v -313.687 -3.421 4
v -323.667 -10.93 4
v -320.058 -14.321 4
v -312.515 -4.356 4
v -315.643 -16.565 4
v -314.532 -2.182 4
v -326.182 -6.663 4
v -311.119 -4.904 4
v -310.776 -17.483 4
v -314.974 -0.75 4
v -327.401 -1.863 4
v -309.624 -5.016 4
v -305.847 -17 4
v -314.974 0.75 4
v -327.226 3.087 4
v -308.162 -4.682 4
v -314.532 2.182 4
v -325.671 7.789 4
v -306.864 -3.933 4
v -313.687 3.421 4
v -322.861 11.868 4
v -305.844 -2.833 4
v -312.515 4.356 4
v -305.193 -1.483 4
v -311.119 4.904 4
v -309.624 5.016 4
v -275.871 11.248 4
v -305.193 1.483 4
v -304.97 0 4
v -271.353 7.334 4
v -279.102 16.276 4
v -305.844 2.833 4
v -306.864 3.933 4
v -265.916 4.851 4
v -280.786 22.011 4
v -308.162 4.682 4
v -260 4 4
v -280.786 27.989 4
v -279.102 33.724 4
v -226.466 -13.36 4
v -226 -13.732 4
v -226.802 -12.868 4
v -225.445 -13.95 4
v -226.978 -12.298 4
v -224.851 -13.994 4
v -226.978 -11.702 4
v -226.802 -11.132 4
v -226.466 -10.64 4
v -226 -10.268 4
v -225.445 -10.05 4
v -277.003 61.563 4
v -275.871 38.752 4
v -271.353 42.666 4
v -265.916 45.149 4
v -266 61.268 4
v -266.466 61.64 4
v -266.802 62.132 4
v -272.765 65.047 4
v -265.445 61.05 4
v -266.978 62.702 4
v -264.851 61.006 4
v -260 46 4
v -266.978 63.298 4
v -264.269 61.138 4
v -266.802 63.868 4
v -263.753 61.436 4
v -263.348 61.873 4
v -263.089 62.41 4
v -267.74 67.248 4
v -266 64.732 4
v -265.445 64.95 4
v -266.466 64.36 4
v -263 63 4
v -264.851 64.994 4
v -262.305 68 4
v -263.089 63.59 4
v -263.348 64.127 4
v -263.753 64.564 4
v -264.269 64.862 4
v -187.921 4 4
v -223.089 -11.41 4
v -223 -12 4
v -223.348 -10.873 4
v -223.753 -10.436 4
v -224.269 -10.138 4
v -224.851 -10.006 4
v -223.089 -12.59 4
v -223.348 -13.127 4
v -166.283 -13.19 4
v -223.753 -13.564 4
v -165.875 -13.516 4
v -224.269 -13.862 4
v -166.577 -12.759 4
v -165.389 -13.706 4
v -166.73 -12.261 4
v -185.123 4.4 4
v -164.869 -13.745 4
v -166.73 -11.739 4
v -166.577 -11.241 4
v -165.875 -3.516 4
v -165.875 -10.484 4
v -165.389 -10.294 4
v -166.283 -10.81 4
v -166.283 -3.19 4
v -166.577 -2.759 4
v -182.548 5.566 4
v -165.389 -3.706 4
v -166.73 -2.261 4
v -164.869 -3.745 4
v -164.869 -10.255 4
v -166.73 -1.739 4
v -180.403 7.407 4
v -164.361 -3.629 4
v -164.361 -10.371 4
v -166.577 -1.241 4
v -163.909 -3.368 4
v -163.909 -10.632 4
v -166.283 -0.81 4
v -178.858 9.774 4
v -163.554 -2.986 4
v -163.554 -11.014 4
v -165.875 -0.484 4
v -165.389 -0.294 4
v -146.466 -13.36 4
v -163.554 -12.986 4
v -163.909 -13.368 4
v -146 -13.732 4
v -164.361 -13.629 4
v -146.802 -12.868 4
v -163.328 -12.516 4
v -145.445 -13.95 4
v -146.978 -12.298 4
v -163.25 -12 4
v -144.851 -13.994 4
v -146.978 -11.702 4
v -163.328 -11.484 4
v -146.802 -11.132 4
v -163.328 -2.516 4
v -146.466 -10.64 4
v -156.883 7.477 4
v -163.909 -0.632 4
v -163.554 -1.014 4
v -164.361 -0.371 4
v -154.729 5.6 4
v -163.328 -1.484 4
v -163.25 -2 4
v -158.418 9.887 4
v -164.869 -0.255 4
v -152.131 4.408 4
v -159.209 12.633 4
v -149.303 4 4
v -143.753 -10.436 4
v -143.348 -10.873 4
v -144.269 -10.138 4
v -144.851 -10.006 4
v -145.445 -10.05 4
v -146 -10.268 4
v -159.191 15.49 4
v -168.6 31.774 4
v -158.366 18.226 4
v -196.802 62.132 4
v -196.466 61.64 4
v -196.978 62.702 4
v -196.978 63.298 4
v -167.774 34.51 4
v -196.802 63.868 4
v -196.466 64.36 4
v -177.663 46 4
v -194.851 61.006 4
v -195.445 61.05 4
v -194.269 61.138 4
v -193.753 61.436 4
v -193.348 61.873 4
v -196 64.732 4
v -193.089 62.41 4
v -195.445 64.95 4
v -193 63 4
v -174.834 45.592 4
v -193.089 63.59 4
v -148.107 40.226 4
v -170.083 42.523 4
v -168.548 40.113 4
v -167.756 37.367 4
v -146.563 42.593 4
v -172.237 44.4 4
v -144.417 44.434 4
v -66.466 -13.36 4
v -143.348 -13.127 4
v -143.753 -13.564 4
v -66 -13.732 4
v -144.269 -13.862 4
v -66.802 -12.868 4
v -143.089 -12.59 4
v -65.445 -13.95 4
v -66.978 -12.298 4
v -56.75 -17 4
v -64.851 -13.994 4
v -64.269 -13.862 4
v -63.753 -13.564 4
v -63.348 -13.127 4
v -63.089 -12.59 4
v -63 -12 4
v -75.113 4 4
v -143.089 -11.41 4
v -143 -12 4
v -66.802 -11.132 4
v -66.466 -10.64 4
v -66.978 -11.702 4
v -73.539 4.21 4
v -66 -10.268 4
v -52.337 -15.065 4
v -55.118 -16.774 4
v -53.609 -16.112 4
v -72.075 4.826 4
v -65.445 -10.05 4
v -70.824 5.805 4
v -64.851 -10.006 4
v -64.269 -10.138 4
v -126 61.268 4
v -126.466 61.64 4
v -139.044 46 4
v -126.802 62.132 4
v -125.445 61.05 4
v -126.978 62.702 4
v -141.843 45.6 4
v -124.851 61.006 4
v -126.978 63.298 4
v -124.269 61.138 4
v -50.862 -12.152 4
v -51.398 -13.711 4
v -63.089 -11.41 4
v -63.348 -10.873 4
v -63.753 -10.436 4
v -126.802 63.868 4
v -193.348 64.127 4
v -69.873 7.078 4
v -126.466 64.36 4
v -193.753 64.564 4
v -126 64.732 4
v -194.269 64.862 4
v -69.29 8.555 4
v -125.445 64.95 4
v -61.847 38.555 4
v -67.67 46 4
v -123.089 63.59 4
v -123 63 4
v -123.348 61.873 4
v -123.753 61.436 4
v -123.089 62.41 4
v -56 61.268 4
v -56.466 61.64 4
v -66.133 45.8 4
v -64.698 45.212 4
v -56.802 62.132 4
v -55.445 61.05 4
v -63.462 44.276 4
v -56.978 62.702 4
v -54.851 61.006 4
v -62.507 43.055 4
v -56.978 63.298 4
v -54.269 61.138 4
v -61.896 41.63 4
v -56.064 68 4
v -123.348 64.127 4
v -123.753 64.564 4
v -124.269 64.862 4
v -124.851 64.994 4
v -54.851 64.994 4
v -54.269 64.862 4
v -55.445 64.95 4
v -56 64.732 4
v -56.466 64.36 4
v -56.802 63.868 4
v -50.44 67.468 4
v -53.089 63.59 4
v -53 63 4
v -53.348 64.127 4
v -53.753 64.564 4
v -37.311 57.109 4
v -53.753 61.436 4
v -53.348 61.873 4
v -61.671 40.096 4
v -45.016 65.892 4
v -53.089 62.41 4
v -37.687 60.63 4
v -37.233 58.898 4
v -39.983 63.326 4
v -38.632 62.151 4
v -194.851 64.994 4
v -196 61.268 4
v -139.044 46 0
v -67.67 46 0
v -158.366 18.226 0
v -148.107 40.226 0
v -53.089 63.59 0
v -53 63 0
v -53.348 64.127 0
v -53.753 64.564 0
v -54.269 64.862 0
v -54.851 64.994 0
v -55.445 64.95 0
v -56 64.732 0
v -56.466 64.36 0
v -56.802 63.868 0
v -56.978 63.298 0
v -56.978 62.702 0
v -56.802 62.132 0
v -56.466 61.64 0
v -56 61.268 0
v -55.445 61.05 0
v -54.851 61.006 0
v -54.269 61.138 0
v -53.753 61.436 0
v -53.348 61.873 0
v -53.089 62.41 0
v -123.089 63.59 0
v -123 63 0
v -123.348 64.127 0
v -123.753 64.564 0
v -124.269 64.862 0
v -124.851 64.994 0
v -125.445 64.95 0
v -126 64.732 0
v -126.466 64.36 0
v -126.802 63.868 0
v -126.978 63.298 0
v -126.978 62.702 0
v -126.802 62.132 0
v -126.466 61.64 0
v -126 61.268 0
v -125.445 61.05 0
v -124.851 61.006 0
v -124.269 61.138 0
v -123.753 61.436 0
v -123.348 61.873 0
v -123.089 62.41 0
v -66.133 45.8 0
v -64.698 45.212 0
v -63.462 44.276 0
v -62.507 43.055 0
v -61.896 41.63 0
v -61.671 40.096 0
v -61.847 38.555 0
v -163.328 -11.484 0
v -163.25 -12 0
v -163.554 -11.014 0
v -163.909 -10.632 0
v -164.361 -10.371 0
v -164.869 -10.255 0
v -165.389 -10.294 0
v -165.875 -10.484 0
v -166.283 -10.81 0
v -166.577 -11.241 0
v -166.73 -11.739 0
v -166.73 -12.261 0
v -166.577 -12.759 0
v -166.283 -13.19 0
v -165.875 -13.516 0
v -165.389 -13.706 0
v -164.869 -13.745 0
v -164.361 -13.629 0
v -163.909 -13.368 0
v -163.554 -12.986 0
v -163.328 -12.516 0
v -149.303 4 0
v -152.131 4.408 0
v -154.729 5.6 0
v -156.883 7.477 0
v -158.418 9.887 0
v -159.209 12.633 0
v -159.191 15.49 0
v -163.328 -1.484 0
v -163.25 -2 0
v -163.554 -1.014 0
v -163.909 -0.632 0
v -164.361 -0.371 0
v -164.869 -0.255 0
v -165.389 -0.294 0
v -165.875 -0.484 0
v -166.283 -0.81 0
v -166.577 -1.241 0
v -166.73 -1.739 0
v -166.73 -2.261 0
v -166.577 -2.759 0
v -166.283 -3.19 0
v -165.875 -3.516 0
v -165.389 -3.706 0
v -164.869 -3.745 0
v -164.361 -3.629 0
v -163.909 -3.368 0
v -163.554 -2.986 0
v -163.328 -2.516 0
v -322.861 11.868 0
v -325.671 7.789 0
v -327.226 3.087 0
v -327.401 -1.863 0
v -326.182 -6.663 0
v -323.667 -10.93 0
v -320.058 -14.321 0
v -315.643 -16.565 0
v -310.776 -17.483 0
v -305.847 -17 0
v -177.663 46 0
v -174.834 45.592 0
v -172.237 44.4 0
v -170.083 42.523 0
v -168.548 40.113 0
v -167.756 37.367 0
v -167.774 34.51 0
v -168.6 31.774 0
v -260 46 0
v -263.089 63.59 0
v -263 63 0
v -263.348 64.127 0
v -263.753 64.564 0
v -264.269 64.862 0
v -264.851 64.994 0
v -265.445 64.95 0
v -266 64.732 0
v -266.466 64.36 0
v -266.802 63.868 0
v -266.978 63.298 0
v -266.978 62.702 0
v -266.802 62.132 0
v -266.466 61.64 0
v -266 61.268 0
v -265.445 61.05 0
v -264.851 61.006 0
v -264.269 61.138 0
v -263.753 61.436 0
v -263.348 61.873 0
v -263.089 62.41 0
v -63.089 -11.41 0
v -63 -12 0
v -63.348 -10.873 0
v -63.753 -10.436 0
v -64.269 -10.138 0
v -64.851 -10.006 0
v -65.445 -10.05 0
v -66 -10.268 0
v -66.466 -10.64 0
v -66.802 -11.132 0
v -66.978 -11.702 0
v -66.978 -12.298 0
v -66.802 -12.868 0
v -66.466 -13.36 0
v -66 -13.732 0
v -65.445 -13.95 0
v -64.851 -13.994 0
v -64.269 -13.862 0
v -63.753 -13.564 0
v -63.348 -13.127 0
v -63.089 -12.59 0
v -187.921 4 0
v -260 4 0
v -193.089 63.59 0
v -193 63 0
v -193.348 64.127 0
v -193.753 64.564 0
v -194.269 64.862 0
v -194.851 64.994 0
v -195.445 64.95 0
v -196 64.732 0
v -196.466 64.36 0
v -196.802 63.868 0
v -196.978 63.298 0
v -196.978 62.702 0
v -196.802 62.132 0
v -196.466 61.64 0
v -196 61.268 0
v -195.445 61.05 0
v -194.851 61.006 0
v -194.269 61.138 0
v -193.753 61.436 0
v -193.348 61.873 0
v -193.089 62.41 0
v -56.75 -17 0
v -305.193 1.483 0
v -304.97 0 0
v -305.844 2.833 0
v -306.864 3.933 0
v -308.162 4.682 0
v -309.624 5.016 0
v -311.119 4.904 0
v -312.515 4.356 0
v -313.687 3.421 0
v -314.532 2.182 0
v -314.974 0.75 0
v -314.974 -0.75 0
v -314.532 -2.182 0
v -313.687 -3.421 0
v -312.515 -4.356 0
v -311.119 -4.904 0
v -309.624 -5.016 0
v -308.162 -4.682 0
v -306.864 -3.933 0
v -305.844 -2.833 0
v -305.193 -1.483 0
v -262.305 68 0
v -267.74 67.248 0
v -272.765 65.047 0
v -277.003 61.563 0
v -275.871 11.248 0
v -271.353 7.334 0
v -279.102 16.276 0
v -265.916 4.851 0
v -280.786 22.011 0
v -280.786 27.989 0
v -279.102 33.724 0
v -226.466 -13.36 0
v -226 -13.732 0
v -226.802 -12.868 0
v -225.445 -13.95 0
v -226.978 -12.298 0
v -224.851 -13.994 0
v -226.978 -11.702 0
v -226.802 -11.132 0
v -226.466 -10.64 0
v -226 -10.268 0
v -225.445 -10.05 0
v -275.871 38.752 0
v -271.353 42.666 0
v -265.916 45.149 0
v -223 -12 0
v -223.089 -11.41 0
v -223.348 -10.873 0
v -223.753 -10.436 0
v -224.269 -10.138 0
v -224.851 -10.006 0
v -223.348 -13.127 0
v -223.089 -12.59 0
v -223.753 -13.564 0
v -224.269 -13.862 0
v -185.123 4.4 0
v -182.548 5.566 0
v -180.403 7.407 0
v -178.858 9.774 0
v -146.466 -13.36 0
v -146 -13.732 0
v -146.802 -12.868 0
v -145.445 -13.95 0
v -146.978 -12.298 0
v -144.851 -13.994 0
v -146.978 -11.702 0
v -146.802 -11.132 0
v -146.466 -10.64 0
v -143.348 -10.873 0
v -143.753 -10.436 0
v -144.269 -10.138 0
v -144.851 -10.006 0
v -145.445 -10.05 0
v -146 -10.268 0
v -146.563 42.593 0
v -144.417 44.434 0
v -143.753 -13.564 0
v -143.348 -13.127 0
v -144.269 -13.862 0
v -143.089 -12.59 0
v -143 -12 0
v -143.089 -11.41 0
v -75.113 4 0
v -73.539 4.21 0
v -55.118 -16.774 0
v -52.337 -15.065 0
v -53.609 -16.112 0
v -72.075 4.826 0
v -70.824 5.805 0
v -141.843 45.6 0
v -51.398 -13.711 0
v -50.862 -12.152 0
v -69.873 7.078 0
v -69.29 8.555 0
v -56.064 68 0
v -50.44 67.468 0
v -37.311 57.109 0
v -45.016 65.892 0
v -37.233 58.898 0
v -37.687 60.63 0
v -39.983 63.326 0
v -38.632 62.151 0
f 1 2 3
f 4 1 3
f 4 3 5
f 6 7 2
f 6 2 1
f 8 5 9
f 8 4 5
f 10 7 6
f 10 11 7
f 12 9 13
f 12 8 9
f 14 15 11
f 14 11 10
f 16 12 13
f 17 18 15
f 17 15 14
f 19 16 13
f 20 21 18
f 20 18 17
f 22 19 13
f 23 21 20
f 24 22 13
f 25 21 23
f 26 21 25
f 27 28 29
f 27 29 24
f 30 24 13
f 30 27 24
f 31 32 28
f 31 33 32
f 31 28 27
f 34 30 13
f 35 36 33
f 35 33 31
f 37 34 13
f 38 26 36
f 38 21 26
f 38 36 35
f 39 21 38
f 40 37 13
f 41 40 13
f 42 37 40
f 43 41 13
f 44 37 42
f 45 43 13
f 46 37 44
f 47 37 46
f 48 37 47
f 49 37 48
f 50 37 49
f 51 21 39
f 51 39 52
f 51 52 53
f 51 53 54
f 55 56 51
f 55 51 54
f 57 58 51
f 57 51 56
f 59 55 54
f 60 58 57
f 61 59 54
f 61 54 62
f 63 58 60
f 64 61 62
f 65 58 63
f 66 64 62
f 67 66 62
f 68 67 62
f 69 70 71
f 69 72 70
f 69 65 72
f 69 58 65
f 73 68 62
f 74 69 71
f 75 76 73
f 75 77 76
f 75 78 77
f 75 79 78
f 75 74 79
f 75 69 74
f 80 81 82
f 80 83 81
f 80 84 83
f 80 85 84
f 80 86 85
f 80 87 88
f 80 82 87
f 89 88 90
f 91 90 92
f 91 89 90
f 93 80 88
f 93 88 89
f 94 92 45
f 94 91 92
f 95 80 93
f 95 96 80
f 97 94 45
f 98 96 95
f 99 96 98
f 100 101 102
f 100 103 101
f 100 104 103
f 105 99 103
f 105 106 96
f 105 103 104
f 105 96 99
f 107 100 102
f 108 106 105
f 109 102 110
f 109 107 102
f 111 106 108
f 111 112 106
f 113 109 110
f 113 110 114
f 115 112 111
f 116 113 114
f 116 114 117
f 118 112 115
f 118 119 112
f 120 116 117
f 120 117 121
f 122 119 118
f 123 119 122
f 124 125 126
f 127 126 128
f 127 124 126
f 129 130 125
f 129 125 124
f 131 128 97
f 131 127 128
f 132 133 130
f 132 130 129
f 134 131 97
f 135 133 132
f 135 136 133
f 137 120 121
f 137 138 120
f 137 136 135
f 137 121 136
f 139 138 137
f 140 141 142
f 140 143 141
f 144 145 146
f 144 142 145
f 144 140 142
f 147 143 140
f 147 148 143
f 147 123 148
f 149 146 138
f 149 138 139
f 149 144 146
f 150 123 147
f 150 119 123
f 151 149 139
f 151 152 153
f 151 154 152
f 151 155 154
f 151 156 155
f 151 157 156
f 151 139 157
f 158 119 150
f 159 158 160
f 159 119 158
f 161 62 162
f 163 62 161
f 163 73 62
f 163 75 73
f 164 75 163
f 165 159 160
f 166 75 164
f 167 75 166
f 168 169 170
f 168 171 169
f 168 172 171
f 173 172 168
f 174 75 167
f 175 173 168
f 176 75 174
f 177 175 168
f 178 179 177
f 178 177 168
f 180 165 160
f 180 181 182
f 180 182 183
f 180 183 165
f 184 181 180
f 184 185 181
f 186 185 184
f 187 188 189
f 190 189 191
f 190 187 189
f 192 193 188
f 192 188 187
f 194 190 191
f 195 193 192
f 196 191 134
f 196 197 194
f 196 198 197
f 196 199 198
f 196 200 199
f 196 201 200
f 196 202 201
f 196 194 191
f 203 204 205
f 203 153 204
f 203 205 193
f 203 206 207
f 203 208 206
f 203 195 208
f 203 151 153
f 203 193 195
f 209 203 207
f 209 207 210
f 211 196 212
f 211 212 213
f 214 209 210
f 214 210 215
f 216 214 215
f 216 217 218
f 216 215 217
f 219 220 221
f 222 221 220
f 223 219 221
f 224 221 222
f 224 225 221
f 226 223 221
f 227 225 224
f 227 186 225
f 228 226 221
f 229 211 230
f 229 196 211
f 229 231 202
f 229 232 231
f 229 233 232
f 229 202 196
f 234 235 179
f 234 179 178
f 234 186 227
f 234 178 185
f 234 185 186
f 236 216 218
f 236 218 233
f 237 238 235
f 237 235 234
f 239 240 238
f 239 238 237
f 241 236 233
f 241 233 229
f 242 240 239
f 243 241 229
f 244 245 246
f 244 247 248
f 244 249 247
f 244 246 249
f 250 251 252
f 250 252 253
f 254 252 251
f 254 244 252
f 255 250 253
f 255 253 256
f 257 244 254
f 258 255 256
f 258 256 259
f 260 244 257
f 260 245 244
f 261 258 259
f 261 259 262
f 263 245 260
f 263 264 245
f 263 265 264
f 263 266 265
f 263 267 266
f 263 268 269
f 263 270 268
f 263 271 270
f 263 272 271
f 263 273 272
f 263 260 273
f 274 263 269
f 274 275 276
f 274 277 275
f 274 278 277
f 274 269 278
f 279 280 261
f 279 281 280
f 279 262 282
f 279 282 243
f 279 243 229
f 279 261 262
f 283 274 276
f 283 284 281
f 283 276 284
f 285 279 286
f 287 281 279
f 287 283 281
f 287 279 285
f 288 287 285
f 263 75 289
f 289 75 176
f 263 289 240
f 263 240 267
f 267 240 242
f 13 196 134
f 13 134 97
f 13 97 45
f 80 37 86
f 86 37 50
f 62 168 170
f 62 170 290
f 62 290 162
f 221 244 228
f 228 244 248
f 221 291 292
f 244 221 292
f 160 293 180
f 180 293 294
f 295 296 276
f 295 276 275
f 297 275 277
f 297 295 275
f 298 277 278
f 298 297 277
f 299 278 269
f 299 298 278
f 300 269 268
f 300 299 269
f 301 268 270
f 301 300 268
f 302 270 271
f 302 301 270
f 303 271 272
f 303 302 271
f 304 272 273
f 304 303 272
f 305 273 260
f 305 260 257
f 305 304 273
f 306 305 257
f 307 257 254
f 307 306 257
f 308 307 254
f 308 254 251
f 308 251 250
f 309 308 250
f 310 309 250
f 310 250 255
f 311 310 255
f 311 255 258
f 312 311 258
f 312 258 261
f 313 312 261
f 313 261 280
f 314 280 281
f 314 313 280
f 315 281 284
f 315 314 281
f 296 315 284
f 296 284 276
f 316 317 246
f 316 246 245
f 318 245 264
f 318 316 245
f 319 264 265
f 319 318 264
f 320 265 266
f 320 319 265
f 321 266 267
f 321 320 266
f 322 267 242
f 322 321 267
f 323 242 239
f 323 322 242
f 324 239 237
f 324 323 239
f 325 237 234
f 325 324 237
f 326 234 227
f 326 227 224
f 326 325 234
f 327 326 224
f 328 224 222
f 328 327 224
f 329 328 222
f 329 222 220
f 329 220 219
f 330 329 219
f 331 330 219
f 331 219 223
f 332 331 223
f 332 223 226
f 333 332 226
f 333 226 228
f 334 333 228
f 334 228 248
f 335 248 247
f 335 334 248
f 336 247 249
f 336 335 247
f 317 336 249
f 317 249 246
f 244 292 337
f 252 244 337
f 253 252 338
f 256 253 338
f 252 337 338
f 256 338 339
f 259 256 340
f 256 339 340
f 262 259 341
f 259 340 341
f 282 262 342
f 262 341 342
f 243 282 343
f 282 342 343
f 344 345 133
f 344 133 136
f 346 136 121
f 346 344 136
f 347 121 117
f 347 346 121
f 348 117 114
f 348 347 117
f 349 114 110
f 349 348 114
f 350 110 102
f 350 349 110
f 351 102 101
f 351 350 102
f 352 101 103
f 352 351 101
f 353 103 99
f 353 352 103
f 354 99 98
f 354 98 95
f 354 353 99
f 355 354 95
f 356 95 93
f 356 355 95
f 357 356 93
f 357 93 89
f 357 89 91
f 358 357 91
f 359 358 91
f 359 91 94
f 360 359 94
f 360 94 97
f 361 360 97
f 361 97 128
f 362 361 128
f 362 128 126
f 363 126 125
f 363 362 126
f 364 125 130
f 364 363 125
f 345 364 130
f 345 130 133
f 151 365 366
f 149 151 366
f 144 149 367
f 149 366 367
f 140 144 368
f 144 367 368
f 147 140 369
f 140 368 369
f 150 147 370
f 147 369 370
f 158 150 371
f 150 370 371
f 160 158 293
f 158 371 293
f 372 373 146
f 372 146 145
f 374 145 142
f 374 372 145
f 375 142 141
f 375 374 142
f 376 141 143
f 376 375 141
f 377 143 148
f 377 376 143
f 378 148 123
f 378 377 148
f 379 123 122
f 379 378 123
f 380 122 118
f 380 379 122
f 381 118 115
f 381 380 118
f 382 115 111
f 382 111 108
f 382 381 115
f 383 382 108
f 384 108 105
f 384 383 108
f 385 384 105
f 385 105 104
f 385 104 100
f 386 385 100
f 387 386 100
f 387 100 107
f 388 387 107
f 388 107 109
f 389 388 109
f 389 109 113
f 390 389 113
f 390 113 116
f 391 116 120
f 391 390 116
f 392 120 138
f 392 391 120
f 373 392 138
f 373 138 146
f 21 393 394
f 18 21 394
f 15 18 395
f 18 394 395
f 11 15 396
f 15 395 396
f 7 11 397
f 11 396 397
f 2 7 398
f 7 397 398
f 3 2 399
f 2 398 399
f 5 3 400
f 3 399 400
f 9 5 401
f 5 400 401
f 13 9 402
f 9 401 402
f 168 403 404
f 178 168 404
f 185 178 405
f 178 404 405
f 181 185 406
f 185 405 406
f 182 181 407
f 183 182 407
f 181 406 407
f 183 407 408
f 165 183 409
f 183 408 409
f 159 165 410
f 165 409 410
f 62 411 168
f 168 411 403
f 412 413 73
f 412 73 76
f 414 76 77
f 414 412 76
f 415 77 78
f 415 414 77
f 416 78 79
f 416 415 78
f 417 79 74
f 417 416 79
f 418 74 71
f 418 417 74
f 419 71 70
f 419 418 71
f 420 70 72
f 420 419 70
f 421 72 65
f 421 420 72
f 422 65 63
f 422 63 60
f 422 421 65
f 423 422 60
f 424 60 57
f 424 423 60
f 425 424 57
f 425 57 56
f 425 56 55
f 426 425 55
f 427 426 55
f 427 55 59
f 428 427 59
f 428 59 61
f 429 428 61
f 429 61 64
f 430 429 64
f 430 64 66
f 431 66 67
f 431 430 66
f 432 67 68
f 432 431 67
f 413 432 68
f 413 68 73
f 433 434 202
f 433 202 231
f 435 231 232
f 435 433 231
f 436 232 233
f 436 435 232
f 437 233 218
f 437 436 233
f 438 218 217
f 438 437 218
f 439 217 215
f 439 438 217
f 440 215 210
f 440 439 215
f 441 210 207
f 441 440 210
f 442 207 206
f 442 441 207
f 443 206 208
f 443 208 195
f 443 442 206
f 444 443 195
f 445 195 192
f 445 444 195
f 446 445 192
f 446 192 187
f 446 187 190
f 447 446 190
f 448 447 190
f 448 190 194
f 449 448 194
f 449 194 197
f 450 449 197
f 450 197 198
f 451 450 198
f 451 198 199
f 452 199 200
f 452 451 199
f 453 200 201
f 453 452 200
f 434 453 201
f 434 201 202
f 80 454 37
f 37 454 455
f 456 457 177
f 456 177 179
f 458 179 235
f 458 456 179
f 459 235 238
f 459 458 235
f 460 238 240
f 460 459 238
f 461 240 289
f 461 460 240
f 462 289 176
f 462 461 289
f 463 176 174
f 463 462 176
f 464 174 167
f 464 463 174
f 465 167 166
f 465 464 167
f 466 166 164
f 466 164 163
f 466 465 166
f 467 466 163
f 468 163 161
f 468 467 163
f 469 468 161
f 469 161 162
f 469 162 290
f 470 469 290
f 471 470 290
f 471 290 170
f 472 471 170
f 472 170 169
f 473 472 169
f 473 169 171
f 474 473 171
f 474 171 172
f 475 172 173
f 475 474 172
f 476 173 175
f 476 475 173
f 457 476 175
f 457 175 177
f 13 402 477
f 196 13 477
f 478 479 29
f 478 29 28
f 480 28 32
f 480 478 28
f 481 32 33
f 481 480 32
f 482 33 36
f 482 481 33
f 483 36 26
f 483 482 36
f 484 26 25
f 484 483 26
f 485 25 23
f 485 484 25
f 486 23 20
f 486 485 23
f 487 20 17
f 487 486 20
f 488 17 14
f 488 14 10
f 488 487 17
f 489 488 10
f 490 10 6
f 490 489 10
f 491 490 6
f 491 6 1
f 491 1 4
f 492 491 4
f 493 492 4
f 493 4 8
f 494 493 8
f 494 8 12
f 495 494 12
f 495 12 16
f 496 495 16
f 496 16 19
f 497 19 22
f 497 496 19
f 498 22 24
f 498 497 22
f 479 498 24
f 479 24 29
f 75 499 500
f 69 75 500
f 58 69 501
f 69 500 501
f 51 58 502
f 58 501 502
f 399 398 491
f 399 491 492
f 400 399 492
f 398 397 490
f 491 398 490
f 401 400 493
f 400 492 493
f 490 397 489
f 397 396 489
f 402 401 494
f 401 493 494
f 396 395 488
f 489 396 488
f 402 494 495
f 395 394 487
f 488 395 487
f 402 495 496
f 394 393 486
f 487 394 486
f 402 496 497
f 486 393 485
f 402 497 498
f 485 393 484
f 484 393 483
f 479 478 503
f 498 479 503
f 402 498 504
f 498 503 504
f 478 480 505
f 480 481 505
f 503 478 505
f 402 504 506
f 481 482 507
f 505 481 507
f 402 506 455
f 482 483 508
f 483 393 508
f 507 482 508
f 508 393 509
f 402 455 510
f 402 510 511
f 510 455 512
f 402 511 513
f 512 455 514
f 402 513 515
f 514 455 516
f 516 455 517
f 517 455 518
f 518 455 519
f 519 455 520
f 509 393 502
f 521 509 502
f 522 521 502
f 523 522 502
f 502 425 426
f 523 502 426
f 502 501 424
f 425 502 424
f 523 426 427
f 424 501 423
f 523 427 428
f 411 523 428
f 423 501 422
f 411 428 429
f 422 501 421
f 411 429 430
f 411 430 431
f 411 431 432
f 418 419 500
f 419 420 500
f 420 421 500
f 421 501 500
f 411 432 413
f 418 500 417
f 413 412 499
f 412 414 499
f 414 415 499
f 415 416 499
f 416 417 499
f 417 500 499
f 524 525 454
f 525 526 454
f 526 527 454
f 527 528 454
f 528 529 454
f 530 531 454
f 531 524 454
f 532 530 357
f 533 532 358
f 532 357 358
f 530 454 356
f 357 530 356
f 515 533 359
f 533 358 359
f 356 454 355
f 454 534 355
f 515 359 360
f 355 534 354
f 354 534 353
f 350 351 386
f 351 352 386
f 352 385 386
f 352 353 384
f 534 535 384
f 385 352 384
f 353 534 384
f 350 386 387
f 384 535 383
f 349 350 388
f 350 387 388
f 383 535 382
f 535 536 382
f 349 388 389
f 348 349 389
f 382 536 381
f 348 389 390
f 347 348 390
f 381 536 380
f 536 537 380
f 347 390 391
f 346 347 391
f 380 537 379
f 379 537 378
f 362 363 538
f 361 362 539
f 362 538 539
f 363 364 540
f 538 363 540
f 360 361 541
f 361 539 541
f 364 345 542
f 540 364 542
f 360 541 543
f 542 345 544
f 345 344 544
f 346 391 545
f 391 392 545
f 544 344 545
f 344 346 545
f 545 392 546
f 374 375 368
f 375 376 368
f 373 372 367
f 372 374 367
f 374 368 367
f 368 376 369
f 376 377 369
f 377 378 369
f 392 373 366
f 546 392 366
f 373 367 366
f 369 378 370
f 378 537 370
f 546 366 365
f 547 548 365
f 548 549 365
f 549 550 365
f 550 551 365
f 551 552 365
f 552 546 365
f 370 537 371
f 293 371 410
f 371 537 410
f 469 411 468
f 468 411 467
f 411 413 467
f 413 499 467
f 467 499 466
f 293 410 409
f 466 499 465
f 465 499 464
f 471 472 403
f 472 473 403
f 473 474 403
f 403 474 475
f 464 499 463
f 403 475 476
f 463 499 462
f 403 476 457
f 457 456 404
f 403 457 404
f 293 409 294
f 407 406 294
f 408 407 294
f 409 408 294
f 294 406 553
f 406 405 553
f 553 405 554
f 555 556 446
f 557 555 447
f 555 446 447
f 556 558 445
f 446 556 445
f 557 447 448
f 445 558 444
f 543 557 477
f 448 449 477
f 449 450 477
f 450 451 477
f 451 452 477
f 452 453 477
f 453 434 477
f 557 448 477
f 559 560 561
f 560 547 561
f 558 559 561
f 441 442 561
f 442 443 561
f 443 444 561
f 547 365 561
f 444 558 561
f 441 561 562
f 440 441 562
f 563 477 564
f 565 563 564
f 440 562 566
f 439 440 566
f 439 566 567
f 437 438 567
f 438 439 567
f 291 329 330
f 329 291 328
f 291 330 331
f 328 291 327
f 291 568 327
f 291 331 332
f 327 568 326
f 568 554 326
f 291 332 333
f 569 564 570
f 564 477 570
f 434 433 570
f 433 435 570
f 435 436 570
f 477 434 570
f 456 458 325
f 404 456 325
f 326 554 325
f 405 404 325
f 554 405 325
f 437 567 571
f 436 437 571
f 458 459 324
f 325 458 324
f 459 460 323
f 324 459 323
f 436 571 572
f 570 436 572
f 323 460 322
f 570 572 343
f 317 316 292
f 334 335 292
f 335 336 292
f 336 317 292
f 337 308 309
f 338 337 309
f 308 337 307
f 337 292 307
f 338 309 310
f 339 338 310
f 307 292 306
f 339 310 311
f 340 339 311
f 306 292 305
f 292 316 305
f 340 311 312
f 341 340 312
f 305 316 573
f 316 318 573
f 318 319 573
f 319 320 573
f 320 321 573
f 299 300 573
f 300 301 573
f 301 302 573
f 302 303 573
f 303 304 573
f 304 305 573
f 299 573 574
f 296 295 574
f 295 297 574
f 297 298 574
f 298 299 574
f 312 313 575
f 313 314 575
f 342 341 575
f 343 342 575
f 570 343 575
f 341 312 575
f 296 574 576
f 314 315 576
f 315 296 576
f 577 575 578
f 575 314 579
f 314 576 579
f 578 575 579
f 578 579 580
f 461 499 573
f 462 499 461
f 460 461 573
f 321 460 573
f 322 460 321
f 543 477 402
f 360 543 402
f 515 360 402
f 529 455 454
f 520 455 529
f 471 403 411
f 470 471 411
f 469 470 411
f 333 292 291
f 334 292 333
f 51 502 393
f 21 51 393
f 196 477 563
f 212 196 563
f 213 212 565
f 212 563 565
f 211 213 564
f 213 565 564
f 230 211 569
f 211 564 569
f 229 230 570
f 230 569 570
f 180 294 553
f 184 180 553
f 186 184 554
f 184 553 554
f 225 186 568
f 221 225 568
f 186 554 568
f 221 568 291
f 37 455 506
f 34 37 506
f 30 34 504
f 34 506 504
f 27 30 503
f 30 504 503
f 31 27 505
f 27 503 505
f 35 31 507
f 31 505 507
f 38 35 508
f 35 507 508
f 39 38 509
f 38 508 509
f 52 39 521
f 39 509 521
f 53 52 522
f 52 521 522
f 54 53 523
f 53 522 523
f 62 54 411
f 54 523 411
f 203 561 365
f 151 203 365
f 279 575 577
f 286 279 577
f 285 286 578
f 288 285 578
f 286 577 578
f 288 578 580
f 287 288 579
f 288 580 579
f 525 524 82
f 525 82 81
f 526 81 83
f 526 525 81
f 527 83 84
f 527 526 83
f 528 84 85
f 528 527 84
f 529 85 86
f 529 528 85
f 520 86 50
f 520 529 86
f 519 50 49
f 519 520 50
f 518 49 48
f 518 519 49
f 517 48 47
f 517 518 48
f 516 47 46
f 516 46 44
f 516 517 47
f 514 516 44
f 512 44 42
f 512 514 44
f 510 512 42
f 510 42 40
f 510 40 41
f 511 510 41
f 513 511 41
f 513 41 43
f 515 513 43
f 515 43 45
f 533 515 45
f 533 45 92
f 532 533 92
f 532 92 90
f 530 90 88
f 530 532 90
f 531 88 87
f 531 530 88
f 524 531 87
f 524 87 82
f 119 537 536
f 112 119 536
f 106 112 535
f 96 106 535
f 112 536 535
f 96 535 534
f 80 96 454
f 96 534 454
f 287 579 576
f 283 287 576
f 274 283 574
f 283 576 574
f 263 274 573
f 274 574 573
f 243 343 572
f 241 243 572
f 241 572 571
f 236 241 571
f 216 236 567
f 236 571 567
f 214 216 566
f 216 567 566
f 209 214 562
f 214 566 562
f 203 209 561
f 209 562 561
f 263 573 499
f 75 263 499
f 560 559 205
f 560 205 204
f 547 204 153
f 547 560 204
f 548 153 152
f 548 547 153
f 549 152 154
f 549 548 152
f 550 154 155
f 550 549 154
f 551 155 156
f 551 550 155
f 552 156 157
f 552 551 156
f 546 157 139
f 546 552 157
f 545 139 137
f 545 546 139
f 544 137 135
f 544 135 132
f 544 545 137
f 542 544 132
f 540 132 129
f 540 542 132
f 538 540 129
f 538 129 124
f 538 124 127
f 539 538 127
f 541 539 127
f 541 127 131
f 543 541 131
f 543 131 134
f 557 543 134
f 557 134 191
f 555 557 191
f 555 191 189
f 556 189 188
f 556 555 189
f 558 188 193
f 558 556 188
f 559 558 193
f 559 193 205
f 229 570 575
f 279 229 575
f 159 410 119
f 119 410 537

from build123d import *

# Parameters (mm, degrees)
SKETCH_2_R      = 5.03
SKETCH_2_R_2    = 2
SKETCH_2_R_3    = 1.75
EXTRUDE_1_DEPTH = 4


with BuildPart() as part:
    # 草图2 → 凸台-拉伸1 (new body)
    with BuildSketch(Plane.XY):
        with BuildLine():
            Line((-56.063767215, 68), (-262.305181408, 68))
            ThreePointArc((-262.305181408, 68), (-270.328158767, 66.320257484), (-277.003482509, 61.56318343))
            Line((-277.003482509, 61.56318343), (-322.861013463, 11.867785501))
            ThreePointArc((-322.861013463, 11.867785501), (-325.076248752, -8.885759595), (-305.846688069, -17))
            Line((-305.846688069, -17), (-56.75042146, -17))
            ThreePointArc((-56.75042146, -17), (-52.936794137, -15.632088799), (-50.862067991, -12.152082213))
            Line((-50.862067991, -12.152082213), (-37.310871287, 57.108804918))
            ThreePointArc((-37.310871287, 57.108804918), (-37.686816243, 60.630138571), (-39.983089141, 63.326108914))
            ThreePointArc((-39.983089141, 63.326108914), (-47.690693329, 66.807839796), (-56.063767215, 68))
        make_face()
        with Locations((-310, 0)):
            Circle(SKETCH_2_R, mode=Mode.SUBTRACT)
        with Locations((-225, -12)):
            Circle(SKETCH_2_R_2, mode=Mode.SUBTRACT)
        with BuildLine():
            Line((-168.599525043, 31.773817383), (-178.858293522, 9.773817383))
            ThreePointArc((-178.858293522, 9.773817383), (-182.548375309, 5.566085542), (-187.921371393, 4))
            Line((-187.921371393, 4), (-260, 4))
            ThreePointArc((-260, 4), (-281, 25), (-260, 46))
            Line((-260, 46), (-177.662602913, 46))
            ThreePointArc((-177.662602913, 46), (-169.228688455, 41.372996083), (-168.599525043, 31.773817383))
        make_face(mode=Mode.SUBTRACT)
        with Locations((-165, -12)):
            Circle(SKETCH_2_R_3, mode=Mode.SUBTRACT)
        with Locations((-145, -12)):
            Circle(SKETCH_2_R_2, mode=Mode.SUBTRACT)
        with Locations((-165, -2)):
            Circle(SKETCH_2_R_3, mode=Mode.SUBTRACT)
        with Locations((-65, -12)):
            Circle(SKETCH_2_R_2, mode=Mode.SUBTRACT)
        with BuildLine():
            Line((-139.044375749, 46), (-67.670495323, 46))
            ThreePointArc((-67.670495323, 46), (-62.94456946, 43.696704578), (-61.847044732, 38.555208246))
            Line((-61.847044732, 38.555208246), (-69.290012085, 8.555208246))
            ThreePointArc((-69.290012085, 8.555208246), (-71.416758098, 5.274074137), (-75.113462676, 4))
            Line((-75.113462676, 4), (-149.303144229, 4))
            ThreePointArc((-149.303144229, 4), (-157.737058687, 8.627003917), (-158.366222099, 18.226182617))
            Line((-158.366222099, 18.226182617), (-148.10745362, 40.226182617))
            ThreePointArc((-148.10745362, 40.226182617), (-144.417371833, 44.433914458), (-139.044375749, 46))
        make_face(mode=Mode.SUBTRACT)
        with Locations((-265, 63)):
            Circle(SKETCH_2_R_2, mode=Mode.SUBTRACT)
        with Locations((-195, 63)):
            Circle(SKETCH_2_R_2, mode=Mode.SUBTRACT)
        with Locations((-125, 63)):
            Circle(SKETCH_2_R_2, mode=Mode.SUBTRACT)
        with Locations((-55, 63)):
            Circle(SKETCH_2_R_2, mode=Mode.SUBTRACT)
    extrude(amount=EXTRUDE_1_DEPTH)


solid = part.part
